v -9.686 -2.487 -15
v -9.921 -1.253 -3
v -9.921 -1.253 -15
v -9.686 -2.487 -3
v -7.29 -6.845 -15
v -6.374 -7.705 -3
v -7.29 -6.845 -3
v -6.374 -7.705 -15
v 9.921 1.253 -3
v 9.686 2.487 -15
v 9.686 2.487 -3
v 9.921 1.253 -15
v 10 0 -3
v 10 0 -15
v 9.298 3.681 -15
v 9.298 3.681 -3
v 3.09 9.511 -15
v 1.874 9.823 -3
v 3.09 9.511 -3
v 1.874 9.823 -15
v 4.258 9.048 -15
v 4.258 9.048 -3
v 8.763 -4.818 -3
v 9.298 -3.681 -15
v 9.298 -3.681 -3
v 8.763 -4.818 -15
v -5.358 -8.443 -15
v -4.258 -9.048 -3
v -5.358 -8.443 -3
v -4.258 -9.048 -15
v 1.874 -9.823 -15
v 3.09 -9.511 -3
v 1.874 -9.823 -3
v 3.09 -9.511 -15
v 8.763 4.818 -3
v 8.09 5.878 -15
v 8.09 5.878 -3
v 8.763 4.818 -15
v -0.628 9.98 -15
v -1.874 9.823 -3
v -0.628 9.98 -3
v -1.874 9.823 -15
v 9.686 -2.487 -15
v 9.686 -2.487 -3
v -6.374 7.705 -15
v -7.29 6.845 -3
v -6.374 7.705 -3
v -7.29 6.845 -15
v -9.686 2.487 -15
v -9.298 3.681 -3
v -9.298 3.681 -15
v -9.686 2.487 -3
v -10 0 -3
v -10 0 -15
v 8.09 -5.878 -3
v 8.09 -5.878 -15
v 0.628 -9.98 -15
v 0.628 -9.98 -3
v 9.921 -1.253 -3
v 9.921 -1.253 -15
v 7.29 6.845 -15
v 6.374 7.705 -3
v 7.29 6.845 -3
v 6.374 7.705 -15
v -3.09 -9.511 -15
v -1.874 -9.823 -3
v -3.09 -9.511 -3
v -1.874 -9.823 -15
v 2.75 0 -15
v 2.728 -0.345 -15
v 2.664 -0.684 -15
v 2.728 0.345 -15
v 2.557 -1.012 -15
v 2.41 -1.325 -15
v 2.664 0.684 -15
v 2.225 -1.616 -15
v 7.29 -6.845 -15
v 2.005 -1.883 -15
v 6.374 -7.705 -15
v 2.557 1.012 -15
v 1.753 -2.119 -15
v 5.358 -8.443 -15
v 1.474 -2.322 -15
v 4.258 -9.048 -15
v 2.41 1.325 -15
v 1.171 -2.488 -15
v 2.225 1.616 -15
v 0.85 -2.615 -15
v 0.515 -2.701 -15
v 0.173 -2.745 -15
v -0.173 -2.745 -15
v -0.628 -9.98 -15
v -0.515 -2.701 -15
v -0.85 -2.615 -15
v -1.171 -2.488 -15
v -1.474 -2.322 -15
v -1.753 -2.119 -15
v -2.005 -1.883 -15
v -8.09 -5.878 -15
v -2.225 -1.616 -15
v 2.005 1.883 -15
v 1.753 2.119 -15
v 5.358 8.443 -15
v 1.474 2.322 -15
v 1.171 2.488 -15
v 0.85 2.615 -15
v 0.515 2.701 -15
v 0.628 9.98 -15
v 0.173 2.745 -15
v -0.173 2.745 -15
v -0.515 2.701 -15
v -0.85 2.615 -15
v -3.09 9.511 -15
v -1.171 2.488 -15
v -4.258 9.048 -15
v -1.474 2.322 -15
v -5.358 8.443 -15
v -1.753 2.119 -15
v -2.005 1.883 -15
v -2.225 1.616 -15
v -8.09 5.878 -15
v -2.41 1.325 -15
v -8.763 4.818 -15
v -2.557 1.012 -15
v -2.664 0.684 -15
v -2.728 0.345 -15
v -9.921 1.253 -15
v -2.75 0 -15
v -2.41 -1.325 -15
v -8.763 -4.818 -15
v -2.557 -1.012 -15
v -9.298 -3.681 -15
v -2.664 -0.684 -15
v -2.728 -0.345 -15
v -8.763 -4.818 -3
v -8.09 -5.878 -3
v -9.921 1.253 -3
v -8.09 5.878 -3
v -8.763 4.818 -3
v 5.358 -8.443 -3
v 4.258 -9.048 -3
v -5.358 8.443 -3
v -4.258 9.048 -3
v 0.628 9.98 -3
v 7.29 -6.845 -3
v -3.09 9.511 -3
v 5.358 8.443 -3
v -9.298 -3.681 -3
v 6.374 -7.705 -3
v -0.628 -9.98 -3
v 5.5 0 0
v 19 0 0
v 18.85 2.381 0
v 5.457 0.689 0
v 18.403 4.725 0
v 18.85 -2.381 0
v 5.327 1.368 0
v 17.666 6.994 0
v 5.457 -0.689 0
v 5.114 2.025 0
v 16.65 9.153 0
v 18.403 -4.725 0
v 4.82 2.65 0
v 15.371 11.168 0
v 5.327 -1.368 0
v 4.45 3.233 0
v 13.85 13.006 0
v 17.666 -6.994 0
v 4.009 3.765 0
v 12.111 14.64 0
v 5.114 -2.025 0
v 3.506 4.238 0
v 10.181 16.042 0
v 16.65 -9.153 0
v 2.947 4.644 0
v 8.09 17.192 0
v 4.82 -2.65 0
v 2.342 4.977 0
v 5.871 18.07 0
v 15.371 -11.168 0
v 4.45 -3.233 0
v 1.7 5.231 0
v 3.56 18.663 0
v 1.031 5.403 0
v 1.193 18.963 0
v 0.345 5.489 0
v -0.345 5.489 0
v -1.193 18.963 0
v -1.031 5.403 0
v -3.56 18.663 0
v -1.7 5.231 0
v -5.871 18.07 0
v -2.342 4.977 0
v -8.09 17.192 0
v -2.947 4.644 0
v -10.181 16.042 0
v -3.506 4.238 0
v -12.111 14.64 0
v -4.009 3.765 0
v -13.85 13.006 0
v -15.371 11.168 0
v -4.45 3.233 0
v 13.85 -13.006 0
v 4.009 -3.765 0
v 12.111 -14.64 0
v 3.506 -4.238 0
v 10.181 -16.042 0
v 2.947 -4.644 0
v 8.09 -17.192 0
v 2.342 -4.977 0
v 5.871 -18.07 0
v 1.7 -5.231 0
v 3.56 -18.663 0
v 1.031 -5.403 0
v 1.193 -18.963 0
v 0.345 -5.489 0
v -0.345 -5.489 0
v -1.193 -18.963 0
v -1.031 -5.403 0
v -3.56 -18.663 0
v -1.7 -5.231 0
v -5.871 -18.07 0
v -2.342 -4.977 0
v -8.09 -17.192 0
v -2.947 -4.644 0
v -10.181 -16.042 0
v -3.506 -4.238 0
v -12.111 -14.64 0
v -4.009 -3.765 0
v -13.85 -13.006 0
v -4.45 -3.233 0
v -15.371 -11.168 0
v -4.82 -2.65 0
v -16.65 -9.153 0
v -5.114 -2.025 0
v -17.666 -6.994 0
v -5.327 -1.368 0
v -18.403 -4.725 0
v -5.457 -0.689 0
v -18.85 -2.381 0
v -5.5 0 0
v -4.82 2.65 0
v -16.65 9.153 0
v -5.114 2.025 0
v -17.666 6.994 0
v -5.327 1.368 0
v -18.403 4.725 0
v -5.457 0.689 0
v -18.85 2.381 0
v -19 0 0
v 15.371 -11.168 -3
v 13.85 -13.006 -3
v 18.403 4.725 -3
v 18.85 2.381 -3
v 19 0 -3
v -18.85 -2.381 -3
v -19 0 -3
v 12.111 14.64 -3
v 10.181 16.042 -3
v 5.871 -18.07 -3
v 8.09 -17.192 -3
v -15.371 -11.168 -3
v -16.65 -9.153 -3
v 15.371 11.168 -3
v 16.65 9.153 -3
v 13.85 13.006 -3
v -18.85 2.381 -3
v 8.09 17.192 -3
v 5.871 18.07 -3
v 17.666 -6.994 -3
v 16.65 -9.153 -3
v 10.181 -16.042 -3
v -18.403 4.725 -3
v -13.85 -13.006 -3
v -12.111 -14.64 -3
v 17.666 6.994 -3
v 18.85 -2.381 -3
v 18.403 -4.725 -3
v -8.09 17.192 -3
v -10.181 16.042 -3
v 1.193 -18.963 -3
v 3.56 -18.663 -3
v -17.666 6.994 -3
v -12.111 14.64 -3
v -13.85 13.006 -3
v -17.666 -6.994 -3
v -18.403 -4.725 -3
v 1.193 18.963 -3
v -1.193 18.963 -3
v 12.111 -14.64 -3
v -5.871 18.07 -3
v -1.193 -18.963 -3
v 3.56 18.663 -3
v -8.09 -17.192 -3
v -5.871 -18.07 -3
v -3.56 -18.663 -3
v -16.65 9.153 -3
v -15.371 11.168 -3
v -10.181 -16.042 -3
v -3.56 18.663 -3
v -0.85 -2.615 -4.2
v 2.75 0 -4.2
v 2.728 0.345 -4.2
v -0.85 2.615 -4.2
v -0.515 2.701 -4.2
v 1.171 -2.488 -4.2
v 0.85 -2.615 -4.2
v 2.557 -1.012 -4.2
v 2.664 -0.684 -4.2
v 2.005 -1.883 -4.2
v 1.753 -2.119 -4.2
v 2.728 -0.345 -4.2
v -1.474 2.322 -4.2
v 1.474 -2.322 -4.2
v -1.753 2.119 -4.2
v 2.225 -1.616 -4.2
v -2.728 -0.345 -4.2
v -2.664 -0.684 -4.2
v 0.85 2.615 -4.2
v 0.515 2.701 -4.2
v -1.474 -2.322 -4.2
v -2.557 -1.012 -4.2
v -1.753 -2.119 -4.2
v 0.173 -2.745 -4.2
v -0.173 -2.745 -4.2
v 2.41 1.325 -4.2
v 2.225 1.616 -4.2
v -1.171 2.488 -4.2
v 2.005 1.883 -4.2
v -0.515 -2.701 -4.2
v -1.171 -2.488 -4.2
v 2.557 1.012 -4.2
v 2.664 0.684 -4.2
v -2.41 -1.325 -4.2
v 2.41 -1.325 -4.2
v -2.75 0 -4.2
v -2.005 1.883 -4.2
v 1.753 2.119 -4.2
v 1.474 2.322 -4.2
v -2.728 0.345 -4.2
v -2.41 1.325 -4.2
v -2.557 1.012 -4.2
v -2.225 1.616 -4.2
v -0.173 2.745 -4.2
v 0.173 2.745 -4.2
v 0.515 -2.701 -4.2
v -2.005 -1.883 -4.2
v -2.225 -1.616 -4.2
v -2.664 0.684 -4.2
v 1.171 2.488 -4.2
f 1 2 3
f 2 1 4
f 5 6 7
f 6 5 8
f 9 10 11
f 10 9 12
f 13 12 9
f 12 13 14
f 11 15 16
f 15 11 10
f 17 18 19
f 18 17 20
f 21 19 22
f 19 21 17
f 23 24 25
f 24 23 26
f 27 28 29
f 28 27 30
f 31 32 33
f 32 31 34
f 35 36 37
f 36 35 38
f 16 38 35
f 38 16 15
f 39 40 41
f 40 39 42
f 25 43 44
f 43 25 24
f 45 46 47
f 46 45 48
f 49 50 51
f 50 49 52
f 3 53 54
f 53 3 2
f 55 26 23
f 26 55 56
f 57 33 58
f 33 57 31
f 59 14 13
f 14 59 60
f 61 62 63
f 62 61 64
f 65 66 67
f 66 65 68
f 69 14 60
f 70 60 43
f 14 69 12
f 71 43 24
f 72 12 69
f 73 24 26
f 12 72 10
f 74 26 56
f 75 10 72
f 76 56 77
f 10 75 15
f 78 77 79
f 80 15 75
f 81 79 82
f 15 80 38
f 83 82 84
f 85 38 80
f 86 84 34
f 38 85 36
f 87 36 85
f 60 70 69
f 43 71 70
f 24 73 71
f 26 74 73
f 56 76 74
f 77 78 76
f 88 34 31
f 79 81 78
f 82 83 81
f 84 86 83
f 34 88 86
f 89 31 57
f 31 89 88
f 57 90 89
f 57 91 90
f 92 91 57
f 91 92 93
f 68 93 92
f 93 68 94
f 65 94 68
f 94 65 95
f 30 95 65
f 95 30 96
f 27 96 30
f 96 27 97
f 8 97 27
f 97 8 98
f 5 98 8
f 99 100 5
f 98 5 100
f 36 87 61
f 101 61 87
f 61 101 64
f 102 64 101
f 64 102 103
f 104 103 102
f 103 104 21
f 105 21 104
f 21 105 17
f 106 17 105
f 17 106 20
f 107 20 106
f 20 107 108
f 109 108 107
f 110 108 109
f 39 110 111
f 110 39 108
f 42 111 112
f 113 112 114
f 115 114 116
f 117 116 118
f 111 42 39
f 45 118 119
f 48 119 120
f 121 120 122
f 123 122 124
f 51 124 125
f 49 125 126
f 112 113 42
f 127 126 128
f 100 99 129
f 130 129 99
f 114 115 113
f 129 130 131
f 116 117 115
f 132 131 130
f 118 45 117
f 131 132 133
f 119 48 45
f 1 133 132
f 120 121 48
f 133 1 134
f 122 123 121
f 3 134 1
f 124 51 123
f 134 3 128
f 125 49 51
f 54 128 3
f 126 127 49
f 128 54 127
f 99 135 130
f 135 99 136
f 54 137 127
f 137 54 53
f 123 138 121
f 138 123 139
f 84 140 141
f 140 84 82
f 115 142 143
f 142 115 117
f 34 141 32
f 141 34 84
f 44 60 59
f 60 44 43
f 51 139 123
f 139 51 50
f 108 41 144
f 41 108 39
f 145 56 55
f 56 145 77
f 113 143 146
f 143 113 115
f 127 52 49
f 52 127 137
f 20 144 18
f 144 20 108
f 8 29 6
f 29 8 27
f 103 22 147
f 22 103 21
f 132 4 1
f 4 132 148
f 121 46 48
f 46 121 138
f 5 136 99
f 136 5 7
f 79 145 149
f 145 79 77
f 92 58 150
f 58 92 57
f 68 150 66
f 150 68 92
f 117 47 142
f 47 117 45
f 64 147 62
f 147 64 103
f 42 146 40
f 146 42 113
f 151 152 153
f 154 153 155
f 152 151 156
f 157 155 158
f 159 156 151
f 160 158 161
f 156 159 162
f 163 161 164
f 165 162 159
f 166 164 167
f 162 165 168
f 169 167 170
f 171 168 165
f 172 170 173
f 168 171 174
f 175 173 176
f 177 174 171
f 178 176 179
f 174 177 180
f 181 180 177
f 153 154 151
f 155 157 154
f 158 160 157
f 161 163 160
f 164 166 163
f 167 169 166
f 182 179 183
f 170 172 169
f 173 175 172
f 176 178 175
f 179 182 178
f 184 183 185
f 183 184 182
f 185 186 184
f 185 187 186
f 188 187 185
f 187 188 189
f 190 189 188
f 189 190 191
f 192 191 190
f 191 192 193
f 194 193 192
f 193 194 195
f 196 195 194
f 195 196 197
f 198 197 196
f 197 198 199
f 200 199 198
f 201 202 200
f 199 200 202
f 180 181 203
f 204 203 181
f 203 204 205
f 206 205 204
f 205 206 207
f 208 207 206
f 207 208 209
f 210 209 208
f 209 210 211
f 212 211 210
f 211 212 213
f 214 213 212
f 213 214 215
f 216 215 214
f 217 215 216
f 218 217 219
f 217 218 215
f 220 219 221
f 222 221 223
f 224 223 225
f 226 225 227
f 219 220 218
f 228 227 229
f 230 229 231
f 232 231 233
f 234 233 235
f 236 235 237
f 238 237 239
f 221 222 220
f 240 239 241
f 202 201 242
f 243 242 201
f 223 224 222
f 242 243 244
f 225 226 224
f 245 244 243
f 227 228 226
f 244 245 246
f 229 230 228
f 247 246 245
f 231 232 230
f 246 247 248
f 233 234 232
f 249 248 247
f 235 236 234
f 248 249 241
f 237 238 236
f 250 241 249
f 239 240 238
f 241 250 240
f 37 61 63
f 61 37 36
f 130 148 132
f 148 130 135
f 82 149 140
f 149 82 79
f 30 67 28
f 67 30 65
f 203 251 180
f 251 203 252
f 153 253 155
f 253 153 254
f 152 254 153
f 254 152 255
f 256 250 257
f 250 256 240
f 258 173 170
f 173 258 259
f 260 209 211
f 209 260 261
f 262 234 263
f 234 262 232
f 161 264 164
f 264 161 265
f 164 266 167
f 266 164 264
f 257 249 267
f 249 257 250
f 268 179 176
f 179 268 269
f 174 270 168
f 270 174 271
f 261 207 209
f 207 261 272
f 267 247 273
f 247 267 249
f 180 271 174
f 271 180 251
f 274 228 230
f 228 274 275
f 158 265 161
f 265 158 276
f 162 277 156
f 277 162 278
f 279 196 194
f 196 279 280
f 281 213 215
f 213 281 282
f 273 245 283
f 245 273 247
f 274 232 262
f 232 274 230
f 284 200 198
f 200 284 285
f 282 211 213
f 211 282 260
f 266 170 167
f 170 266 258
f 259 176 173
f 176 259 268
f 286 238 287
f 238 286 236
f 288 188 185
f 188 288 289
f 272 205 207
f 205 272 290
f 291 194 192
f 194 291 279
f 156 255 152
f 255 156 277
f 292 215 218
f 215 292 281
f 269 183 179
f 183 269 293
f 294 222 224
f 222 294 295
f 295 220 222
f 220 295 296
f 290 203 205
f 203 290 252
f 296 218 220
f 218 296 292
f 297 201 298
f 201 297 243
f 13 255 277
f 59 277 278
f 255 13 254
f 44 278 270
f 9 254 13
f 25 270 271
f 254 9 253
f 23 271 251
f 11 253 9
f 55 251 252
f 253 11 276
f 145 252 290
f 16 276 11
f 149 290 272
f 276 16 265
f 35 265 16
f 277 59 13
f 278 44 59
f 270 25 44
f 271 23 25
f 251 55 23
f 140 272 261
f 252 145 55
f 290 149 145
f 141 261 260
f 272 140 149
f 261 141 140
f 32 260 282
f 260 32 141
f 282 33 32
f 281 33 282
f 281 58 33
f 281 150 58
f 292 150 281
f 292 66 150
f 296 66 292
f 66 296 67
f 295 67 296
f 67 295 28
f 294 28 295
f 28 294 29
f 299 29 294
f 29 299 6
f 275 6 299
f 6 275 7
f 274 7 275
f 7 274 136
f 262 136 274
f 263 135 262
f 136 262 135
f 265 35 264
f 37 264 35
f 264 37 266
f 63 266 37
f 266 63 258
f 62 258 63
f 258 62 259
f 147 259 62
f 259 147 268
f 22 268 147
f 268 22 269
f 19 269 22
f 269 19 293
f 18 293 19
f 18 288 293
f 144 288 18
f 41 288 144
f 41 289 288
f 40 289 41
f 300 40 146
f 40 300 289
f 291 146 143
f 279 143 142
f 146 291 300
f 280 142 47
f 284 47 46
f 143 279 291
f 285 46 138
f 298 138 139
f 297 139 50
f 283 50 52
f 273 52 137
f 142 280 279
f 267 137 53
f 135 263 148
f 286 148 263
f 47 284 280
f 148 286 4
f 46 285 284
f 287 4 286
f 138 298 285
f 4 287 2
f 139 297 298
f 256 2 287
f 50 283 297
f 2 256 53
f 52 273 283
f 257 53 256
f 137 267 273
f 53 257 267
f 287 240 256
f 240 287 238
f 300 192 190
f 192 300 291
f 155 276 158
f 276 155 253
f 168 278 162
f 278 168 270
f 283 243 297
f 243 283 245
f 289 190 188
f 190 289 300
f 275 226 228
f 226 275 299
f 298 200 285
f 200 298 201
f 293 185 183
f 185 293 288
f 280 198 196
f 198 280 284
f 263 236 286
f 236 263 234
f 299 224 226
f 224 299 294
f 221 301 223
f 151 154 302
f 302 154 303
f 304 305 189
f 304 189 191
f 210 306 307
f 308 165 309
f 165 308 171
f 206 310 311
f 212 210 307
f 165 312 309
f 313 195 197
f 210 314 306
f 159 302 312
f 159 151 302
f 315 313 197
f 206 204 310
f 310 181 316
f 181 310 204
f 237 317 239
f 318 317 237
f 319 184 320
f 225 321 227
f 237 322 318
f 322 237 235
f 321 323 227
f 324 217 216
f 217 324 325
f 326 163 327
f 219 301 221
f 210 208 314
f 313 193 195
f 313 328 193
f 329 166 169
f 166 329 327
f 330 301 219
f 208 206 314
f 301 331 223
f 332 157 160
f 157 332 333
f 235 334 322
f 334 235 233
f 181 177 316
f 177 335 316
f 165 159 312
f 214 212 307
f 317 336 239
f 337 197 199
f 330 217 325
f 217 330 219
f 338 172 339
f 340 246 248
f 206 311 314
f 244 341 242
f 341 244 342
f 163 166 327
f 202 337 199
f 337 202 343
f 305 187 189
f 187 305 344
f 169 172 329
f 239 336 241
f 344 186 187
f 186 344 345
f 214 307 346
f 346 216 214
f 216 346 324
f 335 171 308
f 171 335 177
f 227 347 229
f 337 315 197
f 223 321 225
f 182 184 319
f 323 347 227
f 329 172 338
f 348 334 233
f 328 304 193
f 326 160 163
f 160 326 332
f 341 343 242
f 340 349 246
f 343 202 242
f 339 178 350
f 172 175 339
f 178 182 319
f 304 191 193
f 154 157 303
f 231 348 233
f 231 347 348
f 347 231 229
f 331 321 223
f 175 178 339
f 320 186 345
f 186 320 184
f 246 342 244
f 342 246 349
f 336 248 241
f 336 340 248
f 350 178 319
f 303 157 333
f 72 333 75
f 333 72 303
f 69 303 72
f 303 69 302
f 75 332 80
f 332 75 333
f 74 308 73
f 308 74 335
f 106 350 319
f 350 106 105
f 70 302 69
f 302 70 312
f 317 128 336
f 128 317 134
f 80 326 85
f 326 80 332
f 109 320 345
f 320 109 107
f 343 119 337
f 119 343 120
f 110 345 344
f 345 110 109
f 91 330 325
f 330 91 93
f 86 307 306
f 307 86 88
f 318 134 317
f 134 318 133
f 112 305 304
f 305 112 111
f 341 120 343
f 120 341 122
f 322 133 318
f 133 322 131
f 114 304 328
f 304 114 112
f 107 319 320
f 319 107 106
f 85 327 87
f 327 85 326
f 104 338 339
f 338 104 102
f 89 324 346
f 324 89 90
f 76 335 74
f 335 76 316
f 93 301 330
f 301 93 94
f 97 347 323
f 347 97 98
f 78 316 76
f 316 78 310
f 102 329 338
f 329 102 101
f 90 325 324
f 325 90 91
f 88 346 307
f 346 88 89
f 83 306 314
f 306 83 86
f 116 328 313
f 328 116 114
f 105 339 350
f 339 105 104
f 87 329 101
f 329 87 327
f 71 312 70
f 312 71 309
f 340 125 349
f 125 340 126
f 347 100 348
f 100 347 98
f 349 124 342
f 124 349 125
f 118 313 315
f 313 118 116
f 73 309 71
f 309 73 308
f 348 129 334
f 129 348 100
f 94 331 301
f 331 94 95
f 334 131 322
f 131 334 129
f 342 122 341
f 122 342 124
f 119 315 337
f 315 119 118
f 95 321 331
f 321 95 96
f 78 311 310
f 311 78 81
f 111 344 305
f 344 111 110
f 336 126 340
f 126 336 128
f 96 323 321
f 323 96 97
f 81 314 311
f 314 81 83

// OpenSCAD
$fn = 50;


difference() {
	union() {
		translate(v = [0, 0, -15.0000000000]) {
			cylinder(h = 15, r = 10.0000000000);
		}
		translate(v = [0, 0, -3.0000000000]) {
			cylinder(h = 3, r = 19.0000000000);
		}
	}
	union() {
		translate(v = [0, 0, 0]) {
			rotate(a = [0, 0, 0]) {
				difference() {
					union() {
						#translate(v = [0, 0, -15.0000000000]) {
							cylinder(h = 15, r = 2.2500000000);
						}
						#translate(v = [0, 0, -4.2000000000]) {
							cylinder(h = 4.2000000000, r = 10.0000000000, r1 = 2.7500000000, r2 = 5.5000000000);
						}
						#translate(v = [0, 0, -15.0000000000]) {
							cylinder(h = 15, r = 2.7500000000);
						}
						#translate(v = [0, 0, -15.0000000000]) {
							cylinder(h = 15, r = 2.2500000000);
						}
					}
					union();
				}
			}
		}
	}
}
